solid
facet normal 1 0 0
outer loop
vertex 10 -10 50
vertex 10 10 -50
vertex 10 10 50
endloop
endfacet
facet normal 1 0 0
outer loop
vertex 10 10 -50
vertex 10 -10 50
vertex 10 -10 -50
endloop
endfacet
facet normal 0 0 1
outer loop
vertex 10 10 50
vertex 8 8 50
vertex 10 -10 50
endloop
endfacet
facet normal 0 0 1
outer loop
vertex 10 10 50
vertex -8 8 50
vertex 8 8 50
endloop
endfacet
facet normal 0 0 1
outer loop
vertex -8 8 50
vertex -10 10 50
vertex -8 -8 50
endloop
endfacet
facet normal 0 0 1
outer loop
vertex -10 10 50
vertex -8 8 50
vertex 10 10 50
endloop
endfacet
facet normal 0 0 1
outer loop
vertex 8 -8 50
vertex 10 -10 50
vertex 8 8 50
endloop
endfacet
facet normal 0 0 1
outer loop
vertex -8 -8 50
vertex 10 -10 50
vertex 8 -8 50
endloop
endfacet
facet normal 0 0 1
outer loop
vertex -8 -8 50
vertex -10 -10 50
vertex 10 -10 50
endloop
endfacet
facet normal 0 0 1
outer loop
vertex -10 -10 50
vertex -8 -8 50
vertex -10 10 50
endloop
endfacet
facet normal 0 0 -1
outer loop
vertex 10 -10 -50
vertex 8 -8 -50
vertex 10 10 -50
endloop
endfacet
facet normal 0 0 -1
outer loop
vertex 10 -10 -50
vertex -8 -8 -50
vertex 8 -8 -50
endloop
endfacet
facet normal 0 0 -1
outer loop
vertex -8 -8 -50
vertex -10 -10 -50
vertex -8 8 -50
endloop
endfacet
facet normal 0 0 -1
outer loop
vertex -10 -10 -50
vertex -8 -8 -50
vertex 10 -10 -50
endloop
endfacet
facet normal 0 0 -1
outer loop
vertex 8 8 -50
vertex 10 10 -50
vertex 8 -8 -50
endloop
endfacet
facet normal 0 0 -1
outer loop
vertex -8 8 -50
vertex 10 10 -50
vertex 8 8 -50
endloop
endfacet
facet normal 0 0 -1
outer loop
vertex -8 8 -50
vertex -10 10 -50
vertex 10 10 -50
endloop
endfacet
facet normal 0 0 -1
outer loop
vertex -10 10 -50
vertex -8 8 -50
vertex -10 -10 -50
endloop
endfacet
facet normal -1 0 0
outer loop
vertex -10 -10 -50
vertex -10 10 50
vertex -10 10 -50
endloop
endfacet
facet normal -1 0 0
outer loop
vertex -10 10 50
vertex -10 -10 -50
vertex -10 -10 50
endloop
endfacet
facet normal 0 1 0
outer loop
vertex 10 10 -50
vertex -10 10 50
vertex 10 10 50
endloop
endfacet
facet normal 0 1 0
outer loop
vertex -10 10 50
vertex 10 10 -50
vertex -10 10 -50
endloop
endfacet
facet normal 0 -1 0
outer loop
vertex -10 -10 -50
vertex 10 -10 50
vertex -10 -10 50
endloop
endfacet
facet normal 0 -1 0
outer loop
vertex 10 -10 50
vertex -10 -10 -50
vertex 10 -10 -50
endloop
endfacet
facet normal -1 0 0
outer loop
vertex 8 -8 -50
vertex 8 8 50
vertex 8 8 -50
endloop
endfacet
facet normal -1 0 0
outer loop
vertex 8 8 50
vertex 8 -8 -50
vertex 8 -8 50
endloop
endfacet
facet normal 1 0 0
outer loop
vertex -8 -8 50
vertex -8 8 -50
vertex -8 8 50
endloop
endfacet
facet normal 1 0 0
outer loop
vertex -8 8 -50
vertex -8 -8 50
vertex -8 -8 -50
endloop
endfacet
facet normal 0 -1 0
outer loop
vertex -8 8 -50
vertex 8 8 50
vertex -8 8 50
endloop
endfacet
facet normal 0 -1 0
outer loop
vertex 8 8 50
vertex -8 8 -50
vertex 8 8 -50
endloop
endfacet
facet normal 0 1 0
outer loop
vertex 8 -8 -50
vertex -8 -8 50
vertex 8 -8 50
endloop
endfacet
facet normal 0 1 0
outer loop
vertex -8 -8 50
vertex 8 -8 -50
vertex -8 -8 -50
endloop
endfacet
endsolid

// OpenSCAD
// Aluminium rectangular box section: 20mm x 20mm x 2mm wall
// One connected hollow tube (open ends), constant section extrusion

outer_w = 20;
outer_h = 20;
wall_t  = 2;
length_L = 100;

eps = 0.05;

module box_section_tube(ow, oh, t, L) {
    iw = ow - 2*t;
    ih = oh - 2*t;

    assert(iw > 0 && ih > 0, "Wall thickness too large for given outer dimensions.");

    color("Silver")
    difference() {
        // Outer solid
        cube([ow, oh, L], center=true);

        // Inner void: slightly longer to guarantee a clean through-cut
        cube([iw, ih, L + 2*eps], center=true);
    }
}

box_section_tube(outer_w, outer_h, wall_t, length_L);
